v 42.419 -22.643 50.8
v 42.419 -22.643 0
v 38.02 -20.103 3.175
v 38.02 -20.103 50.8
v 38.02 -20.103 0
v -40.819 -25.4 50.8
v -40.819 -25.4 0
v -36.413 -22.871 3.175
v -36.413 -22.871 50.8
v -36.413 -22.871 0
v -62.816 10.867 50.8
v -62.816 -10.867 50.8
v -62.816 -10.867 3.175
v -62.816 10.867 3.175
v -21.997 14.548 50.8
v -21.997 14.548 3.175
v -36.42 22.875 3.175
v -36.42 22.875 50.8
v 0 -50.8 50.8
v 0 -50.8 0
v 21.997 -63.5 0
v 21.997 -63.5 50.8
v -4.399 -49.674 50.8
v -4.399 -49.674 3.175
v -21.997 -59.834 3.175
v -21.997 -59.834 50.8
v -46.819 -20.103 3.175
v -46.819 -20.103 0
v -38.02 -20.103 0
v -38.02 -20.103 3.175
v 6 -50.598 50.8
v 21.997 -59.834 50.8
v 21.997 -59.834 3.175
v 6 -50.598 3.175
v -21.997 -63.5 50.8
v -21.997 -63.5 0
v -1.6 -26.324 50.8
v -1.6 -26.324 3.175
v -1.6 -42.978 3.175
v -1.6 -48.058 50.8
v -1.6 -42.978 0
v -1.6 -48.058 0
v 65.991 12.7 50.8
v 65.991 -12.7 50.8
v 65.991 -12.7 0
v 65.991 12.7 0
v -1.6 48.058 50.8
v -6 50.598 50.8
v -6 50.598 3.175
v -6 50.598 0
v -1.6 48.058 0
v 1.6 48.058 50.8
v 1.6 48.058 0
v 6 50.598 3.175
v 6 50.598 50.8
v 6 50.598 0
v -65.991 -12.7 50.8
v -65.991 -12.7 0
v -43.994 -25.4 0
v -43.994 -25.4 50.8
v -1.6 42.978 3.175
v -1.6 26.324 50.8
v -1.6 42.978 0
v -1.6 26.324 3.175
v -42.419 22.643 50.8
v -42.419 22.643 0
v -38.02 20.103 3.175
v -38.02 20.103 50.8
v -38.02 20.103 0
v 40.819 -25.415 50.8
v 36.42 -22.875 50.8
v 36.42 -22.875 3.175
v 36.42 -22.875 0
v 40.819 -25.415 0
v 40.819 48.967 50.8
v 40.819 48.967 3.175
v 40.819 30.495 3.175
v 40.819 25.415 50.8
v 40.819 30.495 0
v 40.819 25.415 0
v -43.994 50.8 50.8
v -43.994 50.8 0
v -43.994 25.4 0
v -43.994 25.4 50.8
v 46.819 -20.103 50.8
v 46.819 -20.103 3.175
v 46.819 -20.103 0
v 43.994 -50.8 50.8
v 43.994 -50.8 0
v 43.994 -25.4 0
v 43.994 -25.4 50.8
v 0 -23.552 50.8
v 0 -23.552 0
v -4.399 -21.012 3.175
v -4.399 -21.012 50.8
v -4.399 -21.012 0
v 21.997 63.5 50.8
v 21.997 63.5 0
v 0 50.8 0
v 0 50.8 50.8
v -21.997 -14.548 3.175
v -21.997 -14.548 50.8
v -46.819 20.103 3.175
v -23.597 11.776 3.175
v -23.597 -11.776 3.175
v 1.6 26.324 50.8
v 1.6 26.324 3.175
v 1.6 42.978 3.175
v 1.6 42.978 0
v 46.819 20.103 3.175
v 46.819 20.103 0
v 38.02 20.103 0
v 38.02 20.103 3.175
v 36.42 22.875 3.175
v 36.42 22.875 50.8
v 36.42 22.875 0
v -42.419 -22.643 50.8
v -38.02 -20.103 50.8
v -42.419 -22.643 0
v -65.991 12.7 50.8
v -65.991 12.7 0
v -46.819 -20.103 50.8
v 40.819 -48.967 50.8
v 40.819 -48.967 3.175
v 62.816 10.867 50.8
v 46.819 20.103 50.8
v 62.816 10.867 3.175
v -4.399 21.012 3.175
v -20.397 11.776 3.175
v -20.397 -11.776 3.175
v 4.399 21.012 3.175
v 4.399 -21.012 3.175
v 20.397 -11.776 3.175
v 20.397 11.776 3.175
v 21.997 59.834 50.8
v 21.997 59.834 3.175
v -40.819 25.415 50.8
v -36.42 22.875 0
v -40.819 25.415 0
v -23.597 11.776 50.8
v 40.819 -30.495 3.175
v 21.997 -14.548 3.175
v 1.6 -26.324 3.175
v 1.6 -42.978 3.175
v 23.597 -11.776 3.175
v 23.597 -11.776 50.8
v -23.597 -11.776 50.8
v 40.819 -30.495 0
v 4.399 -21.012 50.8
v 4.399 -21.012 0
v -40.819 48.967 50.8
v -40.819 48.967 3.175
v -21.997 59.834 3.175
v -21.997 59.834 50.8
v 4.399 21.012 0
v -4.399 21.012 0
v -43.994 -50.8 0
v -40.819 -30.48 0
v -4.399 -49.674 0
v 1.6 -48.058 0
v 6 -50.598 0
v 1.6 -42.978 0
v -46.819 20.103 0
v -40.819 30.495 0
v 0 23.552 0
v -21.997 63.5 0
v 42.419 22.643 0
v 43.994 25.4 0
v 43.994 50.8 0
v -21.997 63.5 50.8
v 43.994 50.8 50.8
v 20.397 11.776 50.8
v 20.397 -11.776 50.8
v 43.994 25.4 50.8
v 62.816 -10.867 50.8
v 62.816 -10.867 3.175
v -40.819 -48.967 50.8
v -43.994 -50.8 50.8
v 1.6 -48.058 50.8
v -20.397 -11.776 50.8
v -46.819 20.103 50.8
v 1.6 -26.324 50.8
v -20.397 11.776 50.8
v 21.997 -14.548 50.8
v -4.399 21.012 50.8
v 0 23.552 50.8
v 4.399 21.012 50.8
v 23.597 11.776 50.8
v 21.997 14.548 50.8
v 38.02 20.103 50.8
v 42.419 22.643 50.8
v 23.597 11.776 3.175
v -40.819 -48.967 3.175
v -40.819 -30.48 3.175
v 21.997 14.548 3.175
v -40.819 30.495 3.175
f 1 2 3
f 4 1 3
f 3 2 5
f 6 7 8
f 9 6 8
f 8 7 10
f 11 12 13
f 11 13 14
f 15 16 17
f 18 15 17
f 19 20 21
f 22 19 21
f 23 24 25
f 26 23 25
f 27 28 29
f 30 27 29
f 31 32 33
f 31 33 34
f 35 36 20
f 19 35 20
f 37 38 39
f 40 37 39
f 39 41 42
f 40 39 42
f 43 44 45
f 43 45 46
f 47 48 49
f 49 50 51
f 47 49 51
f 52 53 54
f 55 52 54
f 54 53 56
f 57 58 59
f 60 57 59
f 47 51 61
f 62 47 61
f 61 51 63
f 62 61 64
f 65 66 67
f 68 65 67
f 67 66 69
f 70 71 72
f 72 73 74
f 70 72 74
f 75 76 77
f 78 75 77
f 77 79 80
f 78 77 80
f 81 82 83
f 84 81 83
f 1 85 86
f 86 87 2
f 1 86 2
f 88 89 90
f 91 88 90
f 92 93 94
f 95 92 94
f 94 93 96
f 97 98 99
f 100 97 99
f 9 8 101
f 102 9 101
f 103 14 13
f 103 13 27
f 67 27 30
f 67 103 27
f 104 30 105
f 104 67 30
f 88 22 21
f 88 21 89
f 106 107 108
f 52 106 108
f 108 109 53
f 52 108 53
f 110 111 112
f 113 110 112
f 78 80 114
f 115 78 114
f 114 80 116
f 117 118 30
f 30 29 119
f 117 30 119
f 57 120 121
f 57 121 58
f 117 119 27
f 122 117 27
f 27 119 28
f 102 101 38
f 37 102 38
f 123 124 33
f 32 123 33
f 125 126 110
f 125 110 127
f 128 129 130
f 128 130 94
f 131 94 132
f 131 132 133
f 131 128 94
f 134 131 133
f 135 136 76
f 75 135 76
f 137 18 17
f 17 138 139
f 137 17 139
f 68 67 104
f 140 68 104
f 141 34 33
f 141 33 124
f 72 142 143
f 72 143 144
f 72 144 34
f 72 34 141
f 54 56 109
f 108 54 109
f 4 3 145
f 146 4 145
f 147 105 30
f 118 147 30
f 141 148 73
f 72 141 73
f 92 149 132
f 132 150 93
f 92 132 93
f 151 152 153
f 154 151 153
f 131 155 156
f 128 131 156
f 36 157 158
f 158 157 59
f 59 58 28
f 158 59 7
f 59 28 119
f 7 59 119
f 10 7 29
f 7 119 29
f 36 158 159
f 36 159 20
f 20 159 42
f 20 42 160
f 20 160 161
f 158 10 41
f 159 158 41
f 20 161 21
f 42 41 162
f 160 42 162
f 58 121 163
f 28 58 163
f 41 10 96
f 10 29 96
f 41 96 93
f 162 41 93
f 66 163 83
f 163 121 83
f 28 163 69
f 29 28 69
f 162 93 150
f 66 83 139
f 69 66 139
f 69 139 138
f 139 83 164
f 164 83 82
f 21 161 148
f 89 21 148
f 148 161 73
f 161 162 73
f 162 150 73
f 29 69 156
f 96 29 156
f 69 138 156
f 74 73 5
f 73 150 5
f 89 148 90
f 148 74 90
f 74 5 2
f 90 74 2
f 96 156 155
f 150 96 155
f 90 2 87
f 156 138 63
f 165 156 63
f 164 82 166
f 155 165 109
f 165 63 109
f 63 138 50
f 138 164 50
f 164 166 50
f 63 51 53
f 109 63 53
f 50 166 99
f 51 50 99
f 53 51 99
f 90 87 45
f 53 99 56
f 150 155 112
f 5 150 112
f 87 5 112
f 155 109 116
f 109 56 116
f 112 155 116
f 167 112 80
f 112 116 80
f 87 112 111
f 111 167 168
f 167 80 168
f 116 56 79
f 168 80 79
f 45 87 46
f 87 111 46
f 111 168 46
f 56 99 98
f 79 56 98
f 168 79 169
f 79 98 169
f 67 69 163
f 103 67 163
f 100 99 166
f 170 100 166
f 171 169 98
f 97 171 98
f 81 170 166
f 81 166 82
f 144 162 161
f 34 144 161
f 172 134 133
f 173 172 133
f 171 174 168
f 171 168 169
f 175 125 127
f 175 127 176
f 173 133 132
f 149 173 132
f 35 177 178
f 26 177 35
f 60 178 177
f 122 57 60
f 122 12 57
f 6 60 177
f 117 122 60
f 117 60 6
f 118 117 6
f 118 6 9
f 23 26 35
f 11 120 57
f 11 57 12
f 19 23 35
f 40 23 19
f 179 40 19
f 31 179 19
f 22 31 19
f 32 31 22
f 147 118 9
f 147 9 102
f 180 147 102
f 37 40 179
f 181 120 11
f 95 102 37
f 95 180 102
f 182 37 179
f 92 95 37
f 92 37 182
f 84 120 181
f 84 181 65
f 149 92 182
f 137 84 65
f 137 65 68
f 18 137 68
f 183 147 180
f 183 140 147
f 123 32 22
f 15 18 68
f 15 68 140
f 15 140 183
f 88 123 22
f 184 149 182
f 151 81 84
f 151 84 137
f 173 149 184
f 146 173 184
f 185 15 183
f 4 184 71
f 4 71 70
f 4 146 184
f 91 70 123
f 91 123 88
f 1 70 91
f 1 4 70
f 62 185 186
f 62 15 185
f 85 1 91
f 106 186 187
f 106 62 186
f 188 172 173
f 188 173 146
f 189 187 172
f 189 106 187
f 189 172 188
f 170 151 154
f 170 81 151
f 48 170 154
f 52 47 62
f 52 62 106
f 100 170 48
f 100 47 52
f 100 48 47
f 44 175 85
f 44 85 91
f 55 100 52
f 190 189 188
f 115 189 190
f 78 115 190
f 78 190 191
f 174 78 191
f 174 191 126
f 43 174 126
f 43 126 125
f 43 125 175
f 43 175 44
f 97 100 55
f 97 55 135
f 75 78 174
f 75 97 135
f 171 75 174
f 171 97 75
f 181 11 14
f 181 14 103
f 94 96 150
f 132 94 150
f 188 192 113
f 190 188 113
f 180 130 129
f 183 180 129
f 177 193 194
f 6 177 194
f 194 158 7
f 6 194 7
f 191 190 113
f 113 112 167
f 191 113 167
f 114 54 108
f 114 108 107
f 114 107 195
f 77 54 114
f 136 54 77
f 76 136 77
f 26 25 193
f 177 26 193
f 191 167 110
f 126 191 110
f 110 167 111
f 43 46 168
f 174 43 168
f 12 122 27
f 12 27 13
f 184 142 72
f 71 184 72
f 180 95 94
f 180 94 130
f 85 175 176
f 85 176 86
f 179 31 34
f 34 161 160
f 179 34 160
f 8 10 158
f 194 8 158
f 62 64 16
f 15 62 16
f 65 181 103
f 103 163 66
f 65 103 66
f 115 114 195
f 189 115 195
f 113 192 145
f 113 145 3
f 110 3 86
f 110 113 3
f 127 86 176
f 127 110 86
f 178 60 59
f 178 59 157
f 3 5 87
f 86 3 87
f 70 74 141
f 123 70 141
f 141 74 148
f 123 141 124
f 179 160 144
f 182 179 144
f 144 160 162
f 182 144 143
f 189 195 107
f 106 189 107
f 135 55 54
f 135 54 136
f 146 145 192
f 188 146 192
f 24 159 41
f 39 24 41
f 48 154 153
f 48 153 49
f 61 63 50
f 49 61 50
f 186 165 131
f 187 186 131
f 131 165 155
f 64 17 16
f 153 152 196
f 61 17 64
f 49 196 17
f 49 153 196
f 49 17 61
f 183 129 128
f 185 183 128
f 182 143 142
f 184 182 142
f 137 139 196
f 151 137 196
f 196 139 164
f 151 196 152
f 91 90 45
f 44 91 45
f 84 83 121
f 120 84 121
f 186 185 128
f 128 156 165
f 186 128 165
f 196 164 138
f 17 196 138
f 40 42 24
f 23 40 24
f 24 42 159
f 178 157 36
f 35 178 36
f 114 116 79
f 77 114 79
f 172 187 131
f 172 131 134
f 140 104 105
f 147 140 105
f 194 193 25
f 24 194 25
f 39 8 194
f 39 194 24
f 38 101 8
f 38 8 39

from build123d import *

# Parameters (mm, degrees)
F1_DEPTH = 50.8
F2_DEPTH = 3.175


with BuildPart() as f1:
    # F0 (on Top) → F1 (new body)
    with BuildSketch(Plane.XY):
        Polygon((-42.419291, 22.643037), (-40.819091, 23.566913), (-43.994091, 25.4), (-65.991136, 12.7), (-65.991136, -12.7), (-43.994091, -25.4), (-40.819091, -23.566913), (-42.419291, -22.643037), (-46.8187, -20.103037), (-62.816136, -10.866913), (-62.816136, 10.866913), (-46.8187, 20.103037), align=None)
        Polygon((-1.6002, 48.057702), (0, 47.133826), (0, 50.8), (-21.997045, 63.5), (-43.994091, 50.8), (-43.994091, 25.4), (-40.819091, 23.566913), (-40.819091, 25.414665), (-40.819091, 30.494665), (-40.819091, 48.966913), (-21.997045, 59.833826), (-5.999609, 50.597702), align=None)
        Polygon((0, 50.8), (0, 47.133826), (1.6002, 48.057702), (5.999609, 50.597702), (21.997045, 59.833826), (40.819091, 48.966913), (40.819091, 30.494665), (40.819091, 28.646913), (40.819091, 25.414665), (40.819091, 23.566913), (43.994091, 25.4), (43.994091, 50.8), (21.997045, 63.5), align=None)
        Polygon((42.419291, -22.643037), (40.819091, -23.566913), (43.994091, -25.4), (65.991136, -12.7), (65.991136, 12.7), (43.994091, 25.4), (40.819091, 23.566913), (42.419291, 22.643037), (46.8187, 20.103037), (62.816136, 10.866913), (62.816136, -10.866913), (46.8187, -20.103037), align=None)
        Polygon((43.994091, -25.4), (40.819091, -23.566913), (40.819091, -25.414665), (40.819091, -30.494665), (40.819091, -48.966913), (21.997045, -59.833826), (5.999609, -50.597702), (1.6002, -48.057702), (0, -47.133826), (0, -50.8), (21.997045, -63.5), (43.994091, -50.8), align=None)
        Polygon((-40.819091, -25.4), (-40.819091, -23.566913), (-43.994091, -25.4), (-43.994091, -50.8), (-21.997045, -63.5), (0, -50.8), (0, -47.133826), (-1.6002, -48.057702), (-4.399409, -49.673826), (-21.997045, -59.833826), (-40.819091, -48.966913), (-40.819091, -30.48), (-40.819091, -25.414665), align=None)
        Polygon((-21.997045, -12.7), (-21.997045, 12.7), (-40.819091, 23.566913), (-42.419291, 22.643037), (-38.019881, 20.103037), (-23.597245, 11.776124), (-23.597245, -11.776124), (-38.019881, -20.103037), (-42.419291, -22.643037), (-40.819091, -23.566913), align=None)
        Polygon((-21.997045, 12.7), (0, 25.4), (0, 47.133826), (-1.6002, 48.057702), (-1.6002, 42.977702), (-1.6002, 26.323876), (-21.997045, 14.547752), (-36.419681, 22.874665), (-40.819091, 25.414665), (-40.819091, 23.566913), align=None)
        Polygon((21.997045, 12.7), (0, 25.4), (0, 23.552248), (4.399409, 21.012248), (20.396845, 11.776124), (20.396845, -11.776124), (21.997045, -12.7), align=None)
        Polygon((0, -25.4), (-21.997045, -12.7), (-40.819091, -23.566913), (-40.819091, -25.4), (-36.413345, -22.871006), (-21.997045, -14.547752), (-1.6002, -26.323876), (-1.6002, -42.977702), (-1.6002, -48.057702), (0, -47.133826), align=None)
        Polygon((21.997045, -14.547752), (21.997045, -12.7), (0, -25.4), (1.6002, -26.323876), align=None)
        Polygon((0, 47.133826), (0, 25.4), (21.997045, 12.7), (36.419681, 21.026913), (40.819091, 23.566913), (40.819091, 25.414665), (36.419681, 22.874665), (21.997045, 14.547752), (1.6002, 26.323876), (1.6002, 42.977702), (1.6002, 48.057702), align=None)
        Polygon((36.419681, 21.026913), (21.997045, 12.7), (21.997045, -12.7), (40.819091, -23.566913), (42.419291, -22.643037), (38.019881, -20.103037), (23.597245, -11.776124), (23.597245, 11.776124), (38.019881, 20.103037), (42.419291, 22.643037), (40.819091, 23.566913), align=None)
        Polygon((0, 23.552248), (0, 25.4), (-21.997045, 12.7), (-20.396845, 11.776124), (-4.399409, 21.012248), align=None)
        Polygon((40.819091, -23.566913), (21.997045, -12.7), (21.997045, -14.547752), (36.419681, -22.874665), (40.819091, -25.414665), align=None)
        Polygon((1.6002, -26.323876), (0, -25.4), (0, -47.133826), (1.6002, -48.057702), (1.6002, -42.977702), align=None)
        Polygon((-20.396845, 11.776124), (-21.997045, 12.7), (-21.997045, -12.7), (0, -25.4), (0, -23.552248), (-4.399409, -21.012248), (-20.396845, -11.776124), align=None)
        Polygon((0, -25.4), (21.997045, -12.7), (20.396845, -11.776124), (4.399409, -21.012248), (0, -23.552248), align=None)
    extrude(amount=F1_DEPTH)

    # F0 (on Top) → F2 (join)
    with BuildSketch(Plane.XY):
        Polygon((-1.6002, 42.977702), (-5.999609, 50.597702), (-21.997045, 59.833826), (-40.819091, 48.966913), (-40.819091, 30.494665), (-36.419681, 22.874665), (-21.997045, 14.547752), (-1.6002, 26.323876), align=None)
        Polygon((-38.019881, 20.103037), (-46.8187, 20.103037), (-62.816136, 10.866913), (-62.816136, -10.866913), (-46.8187, -20.103037), (-38.019881, -20.103037), (-23.597245, -11.776124), (-23.597245, 11.776124), align=None)
        Polygon((-4.399409, 21.012248), (-20.396845, 11.776124), (-20.396845, -11.776124), (-4.399409, -21.012248), (4.399409, -21.012248), (20.396845, -11.776124), (20.396845, 11.776124), (4.399409, 21.012248), align=None)
        Polygon((21.997045, 59.833826), (5.999609, 50.597702), (1.6002, 42.977702), (1.6002, 26.323876), (21.997045, 14.547752), (36.419681, 22.874665), (40.819091, 30.494665), (40.819091, 48.966913), align=None)
        Polygon((38.019881, -20.103037), (46.8187, -20.103037), (62.816136, -10.866913), (62.816136, 10.866913), (46.8187, 20.103037), (38.019881, 20.103037), (23.597245, 11.776124), (23.597245, -11.776124), align=None)
        Polygon((36.419681, -22.874665), (21.997045, -14.547752), (1.6002, -26.323876), (1.6002, -42.977702), (5.999609, -50.597702), (21.997045, -59.833826), (40.819091, -48.966913), (40.819091, -30.494665), align=None)
        Polygon((-21.997045, -14.547752), (-36.413345, -22.871006), (-40.819091, -30.48), (-40.819091, -48.966913), (-21.997045, -59.833826), (-4.399409, -49.673826), (-1.6002, -42.977702), (-1.6002, -26.323876), align=None)
        Polygon((0, 23.552248), (0, 25.4), (-21.997045, 12.7), (-20.396845, 11.776124), (-4.399409, 21.012248), align=None)
    extrude(amount=F2_DEPTH)


solid = f1.part
